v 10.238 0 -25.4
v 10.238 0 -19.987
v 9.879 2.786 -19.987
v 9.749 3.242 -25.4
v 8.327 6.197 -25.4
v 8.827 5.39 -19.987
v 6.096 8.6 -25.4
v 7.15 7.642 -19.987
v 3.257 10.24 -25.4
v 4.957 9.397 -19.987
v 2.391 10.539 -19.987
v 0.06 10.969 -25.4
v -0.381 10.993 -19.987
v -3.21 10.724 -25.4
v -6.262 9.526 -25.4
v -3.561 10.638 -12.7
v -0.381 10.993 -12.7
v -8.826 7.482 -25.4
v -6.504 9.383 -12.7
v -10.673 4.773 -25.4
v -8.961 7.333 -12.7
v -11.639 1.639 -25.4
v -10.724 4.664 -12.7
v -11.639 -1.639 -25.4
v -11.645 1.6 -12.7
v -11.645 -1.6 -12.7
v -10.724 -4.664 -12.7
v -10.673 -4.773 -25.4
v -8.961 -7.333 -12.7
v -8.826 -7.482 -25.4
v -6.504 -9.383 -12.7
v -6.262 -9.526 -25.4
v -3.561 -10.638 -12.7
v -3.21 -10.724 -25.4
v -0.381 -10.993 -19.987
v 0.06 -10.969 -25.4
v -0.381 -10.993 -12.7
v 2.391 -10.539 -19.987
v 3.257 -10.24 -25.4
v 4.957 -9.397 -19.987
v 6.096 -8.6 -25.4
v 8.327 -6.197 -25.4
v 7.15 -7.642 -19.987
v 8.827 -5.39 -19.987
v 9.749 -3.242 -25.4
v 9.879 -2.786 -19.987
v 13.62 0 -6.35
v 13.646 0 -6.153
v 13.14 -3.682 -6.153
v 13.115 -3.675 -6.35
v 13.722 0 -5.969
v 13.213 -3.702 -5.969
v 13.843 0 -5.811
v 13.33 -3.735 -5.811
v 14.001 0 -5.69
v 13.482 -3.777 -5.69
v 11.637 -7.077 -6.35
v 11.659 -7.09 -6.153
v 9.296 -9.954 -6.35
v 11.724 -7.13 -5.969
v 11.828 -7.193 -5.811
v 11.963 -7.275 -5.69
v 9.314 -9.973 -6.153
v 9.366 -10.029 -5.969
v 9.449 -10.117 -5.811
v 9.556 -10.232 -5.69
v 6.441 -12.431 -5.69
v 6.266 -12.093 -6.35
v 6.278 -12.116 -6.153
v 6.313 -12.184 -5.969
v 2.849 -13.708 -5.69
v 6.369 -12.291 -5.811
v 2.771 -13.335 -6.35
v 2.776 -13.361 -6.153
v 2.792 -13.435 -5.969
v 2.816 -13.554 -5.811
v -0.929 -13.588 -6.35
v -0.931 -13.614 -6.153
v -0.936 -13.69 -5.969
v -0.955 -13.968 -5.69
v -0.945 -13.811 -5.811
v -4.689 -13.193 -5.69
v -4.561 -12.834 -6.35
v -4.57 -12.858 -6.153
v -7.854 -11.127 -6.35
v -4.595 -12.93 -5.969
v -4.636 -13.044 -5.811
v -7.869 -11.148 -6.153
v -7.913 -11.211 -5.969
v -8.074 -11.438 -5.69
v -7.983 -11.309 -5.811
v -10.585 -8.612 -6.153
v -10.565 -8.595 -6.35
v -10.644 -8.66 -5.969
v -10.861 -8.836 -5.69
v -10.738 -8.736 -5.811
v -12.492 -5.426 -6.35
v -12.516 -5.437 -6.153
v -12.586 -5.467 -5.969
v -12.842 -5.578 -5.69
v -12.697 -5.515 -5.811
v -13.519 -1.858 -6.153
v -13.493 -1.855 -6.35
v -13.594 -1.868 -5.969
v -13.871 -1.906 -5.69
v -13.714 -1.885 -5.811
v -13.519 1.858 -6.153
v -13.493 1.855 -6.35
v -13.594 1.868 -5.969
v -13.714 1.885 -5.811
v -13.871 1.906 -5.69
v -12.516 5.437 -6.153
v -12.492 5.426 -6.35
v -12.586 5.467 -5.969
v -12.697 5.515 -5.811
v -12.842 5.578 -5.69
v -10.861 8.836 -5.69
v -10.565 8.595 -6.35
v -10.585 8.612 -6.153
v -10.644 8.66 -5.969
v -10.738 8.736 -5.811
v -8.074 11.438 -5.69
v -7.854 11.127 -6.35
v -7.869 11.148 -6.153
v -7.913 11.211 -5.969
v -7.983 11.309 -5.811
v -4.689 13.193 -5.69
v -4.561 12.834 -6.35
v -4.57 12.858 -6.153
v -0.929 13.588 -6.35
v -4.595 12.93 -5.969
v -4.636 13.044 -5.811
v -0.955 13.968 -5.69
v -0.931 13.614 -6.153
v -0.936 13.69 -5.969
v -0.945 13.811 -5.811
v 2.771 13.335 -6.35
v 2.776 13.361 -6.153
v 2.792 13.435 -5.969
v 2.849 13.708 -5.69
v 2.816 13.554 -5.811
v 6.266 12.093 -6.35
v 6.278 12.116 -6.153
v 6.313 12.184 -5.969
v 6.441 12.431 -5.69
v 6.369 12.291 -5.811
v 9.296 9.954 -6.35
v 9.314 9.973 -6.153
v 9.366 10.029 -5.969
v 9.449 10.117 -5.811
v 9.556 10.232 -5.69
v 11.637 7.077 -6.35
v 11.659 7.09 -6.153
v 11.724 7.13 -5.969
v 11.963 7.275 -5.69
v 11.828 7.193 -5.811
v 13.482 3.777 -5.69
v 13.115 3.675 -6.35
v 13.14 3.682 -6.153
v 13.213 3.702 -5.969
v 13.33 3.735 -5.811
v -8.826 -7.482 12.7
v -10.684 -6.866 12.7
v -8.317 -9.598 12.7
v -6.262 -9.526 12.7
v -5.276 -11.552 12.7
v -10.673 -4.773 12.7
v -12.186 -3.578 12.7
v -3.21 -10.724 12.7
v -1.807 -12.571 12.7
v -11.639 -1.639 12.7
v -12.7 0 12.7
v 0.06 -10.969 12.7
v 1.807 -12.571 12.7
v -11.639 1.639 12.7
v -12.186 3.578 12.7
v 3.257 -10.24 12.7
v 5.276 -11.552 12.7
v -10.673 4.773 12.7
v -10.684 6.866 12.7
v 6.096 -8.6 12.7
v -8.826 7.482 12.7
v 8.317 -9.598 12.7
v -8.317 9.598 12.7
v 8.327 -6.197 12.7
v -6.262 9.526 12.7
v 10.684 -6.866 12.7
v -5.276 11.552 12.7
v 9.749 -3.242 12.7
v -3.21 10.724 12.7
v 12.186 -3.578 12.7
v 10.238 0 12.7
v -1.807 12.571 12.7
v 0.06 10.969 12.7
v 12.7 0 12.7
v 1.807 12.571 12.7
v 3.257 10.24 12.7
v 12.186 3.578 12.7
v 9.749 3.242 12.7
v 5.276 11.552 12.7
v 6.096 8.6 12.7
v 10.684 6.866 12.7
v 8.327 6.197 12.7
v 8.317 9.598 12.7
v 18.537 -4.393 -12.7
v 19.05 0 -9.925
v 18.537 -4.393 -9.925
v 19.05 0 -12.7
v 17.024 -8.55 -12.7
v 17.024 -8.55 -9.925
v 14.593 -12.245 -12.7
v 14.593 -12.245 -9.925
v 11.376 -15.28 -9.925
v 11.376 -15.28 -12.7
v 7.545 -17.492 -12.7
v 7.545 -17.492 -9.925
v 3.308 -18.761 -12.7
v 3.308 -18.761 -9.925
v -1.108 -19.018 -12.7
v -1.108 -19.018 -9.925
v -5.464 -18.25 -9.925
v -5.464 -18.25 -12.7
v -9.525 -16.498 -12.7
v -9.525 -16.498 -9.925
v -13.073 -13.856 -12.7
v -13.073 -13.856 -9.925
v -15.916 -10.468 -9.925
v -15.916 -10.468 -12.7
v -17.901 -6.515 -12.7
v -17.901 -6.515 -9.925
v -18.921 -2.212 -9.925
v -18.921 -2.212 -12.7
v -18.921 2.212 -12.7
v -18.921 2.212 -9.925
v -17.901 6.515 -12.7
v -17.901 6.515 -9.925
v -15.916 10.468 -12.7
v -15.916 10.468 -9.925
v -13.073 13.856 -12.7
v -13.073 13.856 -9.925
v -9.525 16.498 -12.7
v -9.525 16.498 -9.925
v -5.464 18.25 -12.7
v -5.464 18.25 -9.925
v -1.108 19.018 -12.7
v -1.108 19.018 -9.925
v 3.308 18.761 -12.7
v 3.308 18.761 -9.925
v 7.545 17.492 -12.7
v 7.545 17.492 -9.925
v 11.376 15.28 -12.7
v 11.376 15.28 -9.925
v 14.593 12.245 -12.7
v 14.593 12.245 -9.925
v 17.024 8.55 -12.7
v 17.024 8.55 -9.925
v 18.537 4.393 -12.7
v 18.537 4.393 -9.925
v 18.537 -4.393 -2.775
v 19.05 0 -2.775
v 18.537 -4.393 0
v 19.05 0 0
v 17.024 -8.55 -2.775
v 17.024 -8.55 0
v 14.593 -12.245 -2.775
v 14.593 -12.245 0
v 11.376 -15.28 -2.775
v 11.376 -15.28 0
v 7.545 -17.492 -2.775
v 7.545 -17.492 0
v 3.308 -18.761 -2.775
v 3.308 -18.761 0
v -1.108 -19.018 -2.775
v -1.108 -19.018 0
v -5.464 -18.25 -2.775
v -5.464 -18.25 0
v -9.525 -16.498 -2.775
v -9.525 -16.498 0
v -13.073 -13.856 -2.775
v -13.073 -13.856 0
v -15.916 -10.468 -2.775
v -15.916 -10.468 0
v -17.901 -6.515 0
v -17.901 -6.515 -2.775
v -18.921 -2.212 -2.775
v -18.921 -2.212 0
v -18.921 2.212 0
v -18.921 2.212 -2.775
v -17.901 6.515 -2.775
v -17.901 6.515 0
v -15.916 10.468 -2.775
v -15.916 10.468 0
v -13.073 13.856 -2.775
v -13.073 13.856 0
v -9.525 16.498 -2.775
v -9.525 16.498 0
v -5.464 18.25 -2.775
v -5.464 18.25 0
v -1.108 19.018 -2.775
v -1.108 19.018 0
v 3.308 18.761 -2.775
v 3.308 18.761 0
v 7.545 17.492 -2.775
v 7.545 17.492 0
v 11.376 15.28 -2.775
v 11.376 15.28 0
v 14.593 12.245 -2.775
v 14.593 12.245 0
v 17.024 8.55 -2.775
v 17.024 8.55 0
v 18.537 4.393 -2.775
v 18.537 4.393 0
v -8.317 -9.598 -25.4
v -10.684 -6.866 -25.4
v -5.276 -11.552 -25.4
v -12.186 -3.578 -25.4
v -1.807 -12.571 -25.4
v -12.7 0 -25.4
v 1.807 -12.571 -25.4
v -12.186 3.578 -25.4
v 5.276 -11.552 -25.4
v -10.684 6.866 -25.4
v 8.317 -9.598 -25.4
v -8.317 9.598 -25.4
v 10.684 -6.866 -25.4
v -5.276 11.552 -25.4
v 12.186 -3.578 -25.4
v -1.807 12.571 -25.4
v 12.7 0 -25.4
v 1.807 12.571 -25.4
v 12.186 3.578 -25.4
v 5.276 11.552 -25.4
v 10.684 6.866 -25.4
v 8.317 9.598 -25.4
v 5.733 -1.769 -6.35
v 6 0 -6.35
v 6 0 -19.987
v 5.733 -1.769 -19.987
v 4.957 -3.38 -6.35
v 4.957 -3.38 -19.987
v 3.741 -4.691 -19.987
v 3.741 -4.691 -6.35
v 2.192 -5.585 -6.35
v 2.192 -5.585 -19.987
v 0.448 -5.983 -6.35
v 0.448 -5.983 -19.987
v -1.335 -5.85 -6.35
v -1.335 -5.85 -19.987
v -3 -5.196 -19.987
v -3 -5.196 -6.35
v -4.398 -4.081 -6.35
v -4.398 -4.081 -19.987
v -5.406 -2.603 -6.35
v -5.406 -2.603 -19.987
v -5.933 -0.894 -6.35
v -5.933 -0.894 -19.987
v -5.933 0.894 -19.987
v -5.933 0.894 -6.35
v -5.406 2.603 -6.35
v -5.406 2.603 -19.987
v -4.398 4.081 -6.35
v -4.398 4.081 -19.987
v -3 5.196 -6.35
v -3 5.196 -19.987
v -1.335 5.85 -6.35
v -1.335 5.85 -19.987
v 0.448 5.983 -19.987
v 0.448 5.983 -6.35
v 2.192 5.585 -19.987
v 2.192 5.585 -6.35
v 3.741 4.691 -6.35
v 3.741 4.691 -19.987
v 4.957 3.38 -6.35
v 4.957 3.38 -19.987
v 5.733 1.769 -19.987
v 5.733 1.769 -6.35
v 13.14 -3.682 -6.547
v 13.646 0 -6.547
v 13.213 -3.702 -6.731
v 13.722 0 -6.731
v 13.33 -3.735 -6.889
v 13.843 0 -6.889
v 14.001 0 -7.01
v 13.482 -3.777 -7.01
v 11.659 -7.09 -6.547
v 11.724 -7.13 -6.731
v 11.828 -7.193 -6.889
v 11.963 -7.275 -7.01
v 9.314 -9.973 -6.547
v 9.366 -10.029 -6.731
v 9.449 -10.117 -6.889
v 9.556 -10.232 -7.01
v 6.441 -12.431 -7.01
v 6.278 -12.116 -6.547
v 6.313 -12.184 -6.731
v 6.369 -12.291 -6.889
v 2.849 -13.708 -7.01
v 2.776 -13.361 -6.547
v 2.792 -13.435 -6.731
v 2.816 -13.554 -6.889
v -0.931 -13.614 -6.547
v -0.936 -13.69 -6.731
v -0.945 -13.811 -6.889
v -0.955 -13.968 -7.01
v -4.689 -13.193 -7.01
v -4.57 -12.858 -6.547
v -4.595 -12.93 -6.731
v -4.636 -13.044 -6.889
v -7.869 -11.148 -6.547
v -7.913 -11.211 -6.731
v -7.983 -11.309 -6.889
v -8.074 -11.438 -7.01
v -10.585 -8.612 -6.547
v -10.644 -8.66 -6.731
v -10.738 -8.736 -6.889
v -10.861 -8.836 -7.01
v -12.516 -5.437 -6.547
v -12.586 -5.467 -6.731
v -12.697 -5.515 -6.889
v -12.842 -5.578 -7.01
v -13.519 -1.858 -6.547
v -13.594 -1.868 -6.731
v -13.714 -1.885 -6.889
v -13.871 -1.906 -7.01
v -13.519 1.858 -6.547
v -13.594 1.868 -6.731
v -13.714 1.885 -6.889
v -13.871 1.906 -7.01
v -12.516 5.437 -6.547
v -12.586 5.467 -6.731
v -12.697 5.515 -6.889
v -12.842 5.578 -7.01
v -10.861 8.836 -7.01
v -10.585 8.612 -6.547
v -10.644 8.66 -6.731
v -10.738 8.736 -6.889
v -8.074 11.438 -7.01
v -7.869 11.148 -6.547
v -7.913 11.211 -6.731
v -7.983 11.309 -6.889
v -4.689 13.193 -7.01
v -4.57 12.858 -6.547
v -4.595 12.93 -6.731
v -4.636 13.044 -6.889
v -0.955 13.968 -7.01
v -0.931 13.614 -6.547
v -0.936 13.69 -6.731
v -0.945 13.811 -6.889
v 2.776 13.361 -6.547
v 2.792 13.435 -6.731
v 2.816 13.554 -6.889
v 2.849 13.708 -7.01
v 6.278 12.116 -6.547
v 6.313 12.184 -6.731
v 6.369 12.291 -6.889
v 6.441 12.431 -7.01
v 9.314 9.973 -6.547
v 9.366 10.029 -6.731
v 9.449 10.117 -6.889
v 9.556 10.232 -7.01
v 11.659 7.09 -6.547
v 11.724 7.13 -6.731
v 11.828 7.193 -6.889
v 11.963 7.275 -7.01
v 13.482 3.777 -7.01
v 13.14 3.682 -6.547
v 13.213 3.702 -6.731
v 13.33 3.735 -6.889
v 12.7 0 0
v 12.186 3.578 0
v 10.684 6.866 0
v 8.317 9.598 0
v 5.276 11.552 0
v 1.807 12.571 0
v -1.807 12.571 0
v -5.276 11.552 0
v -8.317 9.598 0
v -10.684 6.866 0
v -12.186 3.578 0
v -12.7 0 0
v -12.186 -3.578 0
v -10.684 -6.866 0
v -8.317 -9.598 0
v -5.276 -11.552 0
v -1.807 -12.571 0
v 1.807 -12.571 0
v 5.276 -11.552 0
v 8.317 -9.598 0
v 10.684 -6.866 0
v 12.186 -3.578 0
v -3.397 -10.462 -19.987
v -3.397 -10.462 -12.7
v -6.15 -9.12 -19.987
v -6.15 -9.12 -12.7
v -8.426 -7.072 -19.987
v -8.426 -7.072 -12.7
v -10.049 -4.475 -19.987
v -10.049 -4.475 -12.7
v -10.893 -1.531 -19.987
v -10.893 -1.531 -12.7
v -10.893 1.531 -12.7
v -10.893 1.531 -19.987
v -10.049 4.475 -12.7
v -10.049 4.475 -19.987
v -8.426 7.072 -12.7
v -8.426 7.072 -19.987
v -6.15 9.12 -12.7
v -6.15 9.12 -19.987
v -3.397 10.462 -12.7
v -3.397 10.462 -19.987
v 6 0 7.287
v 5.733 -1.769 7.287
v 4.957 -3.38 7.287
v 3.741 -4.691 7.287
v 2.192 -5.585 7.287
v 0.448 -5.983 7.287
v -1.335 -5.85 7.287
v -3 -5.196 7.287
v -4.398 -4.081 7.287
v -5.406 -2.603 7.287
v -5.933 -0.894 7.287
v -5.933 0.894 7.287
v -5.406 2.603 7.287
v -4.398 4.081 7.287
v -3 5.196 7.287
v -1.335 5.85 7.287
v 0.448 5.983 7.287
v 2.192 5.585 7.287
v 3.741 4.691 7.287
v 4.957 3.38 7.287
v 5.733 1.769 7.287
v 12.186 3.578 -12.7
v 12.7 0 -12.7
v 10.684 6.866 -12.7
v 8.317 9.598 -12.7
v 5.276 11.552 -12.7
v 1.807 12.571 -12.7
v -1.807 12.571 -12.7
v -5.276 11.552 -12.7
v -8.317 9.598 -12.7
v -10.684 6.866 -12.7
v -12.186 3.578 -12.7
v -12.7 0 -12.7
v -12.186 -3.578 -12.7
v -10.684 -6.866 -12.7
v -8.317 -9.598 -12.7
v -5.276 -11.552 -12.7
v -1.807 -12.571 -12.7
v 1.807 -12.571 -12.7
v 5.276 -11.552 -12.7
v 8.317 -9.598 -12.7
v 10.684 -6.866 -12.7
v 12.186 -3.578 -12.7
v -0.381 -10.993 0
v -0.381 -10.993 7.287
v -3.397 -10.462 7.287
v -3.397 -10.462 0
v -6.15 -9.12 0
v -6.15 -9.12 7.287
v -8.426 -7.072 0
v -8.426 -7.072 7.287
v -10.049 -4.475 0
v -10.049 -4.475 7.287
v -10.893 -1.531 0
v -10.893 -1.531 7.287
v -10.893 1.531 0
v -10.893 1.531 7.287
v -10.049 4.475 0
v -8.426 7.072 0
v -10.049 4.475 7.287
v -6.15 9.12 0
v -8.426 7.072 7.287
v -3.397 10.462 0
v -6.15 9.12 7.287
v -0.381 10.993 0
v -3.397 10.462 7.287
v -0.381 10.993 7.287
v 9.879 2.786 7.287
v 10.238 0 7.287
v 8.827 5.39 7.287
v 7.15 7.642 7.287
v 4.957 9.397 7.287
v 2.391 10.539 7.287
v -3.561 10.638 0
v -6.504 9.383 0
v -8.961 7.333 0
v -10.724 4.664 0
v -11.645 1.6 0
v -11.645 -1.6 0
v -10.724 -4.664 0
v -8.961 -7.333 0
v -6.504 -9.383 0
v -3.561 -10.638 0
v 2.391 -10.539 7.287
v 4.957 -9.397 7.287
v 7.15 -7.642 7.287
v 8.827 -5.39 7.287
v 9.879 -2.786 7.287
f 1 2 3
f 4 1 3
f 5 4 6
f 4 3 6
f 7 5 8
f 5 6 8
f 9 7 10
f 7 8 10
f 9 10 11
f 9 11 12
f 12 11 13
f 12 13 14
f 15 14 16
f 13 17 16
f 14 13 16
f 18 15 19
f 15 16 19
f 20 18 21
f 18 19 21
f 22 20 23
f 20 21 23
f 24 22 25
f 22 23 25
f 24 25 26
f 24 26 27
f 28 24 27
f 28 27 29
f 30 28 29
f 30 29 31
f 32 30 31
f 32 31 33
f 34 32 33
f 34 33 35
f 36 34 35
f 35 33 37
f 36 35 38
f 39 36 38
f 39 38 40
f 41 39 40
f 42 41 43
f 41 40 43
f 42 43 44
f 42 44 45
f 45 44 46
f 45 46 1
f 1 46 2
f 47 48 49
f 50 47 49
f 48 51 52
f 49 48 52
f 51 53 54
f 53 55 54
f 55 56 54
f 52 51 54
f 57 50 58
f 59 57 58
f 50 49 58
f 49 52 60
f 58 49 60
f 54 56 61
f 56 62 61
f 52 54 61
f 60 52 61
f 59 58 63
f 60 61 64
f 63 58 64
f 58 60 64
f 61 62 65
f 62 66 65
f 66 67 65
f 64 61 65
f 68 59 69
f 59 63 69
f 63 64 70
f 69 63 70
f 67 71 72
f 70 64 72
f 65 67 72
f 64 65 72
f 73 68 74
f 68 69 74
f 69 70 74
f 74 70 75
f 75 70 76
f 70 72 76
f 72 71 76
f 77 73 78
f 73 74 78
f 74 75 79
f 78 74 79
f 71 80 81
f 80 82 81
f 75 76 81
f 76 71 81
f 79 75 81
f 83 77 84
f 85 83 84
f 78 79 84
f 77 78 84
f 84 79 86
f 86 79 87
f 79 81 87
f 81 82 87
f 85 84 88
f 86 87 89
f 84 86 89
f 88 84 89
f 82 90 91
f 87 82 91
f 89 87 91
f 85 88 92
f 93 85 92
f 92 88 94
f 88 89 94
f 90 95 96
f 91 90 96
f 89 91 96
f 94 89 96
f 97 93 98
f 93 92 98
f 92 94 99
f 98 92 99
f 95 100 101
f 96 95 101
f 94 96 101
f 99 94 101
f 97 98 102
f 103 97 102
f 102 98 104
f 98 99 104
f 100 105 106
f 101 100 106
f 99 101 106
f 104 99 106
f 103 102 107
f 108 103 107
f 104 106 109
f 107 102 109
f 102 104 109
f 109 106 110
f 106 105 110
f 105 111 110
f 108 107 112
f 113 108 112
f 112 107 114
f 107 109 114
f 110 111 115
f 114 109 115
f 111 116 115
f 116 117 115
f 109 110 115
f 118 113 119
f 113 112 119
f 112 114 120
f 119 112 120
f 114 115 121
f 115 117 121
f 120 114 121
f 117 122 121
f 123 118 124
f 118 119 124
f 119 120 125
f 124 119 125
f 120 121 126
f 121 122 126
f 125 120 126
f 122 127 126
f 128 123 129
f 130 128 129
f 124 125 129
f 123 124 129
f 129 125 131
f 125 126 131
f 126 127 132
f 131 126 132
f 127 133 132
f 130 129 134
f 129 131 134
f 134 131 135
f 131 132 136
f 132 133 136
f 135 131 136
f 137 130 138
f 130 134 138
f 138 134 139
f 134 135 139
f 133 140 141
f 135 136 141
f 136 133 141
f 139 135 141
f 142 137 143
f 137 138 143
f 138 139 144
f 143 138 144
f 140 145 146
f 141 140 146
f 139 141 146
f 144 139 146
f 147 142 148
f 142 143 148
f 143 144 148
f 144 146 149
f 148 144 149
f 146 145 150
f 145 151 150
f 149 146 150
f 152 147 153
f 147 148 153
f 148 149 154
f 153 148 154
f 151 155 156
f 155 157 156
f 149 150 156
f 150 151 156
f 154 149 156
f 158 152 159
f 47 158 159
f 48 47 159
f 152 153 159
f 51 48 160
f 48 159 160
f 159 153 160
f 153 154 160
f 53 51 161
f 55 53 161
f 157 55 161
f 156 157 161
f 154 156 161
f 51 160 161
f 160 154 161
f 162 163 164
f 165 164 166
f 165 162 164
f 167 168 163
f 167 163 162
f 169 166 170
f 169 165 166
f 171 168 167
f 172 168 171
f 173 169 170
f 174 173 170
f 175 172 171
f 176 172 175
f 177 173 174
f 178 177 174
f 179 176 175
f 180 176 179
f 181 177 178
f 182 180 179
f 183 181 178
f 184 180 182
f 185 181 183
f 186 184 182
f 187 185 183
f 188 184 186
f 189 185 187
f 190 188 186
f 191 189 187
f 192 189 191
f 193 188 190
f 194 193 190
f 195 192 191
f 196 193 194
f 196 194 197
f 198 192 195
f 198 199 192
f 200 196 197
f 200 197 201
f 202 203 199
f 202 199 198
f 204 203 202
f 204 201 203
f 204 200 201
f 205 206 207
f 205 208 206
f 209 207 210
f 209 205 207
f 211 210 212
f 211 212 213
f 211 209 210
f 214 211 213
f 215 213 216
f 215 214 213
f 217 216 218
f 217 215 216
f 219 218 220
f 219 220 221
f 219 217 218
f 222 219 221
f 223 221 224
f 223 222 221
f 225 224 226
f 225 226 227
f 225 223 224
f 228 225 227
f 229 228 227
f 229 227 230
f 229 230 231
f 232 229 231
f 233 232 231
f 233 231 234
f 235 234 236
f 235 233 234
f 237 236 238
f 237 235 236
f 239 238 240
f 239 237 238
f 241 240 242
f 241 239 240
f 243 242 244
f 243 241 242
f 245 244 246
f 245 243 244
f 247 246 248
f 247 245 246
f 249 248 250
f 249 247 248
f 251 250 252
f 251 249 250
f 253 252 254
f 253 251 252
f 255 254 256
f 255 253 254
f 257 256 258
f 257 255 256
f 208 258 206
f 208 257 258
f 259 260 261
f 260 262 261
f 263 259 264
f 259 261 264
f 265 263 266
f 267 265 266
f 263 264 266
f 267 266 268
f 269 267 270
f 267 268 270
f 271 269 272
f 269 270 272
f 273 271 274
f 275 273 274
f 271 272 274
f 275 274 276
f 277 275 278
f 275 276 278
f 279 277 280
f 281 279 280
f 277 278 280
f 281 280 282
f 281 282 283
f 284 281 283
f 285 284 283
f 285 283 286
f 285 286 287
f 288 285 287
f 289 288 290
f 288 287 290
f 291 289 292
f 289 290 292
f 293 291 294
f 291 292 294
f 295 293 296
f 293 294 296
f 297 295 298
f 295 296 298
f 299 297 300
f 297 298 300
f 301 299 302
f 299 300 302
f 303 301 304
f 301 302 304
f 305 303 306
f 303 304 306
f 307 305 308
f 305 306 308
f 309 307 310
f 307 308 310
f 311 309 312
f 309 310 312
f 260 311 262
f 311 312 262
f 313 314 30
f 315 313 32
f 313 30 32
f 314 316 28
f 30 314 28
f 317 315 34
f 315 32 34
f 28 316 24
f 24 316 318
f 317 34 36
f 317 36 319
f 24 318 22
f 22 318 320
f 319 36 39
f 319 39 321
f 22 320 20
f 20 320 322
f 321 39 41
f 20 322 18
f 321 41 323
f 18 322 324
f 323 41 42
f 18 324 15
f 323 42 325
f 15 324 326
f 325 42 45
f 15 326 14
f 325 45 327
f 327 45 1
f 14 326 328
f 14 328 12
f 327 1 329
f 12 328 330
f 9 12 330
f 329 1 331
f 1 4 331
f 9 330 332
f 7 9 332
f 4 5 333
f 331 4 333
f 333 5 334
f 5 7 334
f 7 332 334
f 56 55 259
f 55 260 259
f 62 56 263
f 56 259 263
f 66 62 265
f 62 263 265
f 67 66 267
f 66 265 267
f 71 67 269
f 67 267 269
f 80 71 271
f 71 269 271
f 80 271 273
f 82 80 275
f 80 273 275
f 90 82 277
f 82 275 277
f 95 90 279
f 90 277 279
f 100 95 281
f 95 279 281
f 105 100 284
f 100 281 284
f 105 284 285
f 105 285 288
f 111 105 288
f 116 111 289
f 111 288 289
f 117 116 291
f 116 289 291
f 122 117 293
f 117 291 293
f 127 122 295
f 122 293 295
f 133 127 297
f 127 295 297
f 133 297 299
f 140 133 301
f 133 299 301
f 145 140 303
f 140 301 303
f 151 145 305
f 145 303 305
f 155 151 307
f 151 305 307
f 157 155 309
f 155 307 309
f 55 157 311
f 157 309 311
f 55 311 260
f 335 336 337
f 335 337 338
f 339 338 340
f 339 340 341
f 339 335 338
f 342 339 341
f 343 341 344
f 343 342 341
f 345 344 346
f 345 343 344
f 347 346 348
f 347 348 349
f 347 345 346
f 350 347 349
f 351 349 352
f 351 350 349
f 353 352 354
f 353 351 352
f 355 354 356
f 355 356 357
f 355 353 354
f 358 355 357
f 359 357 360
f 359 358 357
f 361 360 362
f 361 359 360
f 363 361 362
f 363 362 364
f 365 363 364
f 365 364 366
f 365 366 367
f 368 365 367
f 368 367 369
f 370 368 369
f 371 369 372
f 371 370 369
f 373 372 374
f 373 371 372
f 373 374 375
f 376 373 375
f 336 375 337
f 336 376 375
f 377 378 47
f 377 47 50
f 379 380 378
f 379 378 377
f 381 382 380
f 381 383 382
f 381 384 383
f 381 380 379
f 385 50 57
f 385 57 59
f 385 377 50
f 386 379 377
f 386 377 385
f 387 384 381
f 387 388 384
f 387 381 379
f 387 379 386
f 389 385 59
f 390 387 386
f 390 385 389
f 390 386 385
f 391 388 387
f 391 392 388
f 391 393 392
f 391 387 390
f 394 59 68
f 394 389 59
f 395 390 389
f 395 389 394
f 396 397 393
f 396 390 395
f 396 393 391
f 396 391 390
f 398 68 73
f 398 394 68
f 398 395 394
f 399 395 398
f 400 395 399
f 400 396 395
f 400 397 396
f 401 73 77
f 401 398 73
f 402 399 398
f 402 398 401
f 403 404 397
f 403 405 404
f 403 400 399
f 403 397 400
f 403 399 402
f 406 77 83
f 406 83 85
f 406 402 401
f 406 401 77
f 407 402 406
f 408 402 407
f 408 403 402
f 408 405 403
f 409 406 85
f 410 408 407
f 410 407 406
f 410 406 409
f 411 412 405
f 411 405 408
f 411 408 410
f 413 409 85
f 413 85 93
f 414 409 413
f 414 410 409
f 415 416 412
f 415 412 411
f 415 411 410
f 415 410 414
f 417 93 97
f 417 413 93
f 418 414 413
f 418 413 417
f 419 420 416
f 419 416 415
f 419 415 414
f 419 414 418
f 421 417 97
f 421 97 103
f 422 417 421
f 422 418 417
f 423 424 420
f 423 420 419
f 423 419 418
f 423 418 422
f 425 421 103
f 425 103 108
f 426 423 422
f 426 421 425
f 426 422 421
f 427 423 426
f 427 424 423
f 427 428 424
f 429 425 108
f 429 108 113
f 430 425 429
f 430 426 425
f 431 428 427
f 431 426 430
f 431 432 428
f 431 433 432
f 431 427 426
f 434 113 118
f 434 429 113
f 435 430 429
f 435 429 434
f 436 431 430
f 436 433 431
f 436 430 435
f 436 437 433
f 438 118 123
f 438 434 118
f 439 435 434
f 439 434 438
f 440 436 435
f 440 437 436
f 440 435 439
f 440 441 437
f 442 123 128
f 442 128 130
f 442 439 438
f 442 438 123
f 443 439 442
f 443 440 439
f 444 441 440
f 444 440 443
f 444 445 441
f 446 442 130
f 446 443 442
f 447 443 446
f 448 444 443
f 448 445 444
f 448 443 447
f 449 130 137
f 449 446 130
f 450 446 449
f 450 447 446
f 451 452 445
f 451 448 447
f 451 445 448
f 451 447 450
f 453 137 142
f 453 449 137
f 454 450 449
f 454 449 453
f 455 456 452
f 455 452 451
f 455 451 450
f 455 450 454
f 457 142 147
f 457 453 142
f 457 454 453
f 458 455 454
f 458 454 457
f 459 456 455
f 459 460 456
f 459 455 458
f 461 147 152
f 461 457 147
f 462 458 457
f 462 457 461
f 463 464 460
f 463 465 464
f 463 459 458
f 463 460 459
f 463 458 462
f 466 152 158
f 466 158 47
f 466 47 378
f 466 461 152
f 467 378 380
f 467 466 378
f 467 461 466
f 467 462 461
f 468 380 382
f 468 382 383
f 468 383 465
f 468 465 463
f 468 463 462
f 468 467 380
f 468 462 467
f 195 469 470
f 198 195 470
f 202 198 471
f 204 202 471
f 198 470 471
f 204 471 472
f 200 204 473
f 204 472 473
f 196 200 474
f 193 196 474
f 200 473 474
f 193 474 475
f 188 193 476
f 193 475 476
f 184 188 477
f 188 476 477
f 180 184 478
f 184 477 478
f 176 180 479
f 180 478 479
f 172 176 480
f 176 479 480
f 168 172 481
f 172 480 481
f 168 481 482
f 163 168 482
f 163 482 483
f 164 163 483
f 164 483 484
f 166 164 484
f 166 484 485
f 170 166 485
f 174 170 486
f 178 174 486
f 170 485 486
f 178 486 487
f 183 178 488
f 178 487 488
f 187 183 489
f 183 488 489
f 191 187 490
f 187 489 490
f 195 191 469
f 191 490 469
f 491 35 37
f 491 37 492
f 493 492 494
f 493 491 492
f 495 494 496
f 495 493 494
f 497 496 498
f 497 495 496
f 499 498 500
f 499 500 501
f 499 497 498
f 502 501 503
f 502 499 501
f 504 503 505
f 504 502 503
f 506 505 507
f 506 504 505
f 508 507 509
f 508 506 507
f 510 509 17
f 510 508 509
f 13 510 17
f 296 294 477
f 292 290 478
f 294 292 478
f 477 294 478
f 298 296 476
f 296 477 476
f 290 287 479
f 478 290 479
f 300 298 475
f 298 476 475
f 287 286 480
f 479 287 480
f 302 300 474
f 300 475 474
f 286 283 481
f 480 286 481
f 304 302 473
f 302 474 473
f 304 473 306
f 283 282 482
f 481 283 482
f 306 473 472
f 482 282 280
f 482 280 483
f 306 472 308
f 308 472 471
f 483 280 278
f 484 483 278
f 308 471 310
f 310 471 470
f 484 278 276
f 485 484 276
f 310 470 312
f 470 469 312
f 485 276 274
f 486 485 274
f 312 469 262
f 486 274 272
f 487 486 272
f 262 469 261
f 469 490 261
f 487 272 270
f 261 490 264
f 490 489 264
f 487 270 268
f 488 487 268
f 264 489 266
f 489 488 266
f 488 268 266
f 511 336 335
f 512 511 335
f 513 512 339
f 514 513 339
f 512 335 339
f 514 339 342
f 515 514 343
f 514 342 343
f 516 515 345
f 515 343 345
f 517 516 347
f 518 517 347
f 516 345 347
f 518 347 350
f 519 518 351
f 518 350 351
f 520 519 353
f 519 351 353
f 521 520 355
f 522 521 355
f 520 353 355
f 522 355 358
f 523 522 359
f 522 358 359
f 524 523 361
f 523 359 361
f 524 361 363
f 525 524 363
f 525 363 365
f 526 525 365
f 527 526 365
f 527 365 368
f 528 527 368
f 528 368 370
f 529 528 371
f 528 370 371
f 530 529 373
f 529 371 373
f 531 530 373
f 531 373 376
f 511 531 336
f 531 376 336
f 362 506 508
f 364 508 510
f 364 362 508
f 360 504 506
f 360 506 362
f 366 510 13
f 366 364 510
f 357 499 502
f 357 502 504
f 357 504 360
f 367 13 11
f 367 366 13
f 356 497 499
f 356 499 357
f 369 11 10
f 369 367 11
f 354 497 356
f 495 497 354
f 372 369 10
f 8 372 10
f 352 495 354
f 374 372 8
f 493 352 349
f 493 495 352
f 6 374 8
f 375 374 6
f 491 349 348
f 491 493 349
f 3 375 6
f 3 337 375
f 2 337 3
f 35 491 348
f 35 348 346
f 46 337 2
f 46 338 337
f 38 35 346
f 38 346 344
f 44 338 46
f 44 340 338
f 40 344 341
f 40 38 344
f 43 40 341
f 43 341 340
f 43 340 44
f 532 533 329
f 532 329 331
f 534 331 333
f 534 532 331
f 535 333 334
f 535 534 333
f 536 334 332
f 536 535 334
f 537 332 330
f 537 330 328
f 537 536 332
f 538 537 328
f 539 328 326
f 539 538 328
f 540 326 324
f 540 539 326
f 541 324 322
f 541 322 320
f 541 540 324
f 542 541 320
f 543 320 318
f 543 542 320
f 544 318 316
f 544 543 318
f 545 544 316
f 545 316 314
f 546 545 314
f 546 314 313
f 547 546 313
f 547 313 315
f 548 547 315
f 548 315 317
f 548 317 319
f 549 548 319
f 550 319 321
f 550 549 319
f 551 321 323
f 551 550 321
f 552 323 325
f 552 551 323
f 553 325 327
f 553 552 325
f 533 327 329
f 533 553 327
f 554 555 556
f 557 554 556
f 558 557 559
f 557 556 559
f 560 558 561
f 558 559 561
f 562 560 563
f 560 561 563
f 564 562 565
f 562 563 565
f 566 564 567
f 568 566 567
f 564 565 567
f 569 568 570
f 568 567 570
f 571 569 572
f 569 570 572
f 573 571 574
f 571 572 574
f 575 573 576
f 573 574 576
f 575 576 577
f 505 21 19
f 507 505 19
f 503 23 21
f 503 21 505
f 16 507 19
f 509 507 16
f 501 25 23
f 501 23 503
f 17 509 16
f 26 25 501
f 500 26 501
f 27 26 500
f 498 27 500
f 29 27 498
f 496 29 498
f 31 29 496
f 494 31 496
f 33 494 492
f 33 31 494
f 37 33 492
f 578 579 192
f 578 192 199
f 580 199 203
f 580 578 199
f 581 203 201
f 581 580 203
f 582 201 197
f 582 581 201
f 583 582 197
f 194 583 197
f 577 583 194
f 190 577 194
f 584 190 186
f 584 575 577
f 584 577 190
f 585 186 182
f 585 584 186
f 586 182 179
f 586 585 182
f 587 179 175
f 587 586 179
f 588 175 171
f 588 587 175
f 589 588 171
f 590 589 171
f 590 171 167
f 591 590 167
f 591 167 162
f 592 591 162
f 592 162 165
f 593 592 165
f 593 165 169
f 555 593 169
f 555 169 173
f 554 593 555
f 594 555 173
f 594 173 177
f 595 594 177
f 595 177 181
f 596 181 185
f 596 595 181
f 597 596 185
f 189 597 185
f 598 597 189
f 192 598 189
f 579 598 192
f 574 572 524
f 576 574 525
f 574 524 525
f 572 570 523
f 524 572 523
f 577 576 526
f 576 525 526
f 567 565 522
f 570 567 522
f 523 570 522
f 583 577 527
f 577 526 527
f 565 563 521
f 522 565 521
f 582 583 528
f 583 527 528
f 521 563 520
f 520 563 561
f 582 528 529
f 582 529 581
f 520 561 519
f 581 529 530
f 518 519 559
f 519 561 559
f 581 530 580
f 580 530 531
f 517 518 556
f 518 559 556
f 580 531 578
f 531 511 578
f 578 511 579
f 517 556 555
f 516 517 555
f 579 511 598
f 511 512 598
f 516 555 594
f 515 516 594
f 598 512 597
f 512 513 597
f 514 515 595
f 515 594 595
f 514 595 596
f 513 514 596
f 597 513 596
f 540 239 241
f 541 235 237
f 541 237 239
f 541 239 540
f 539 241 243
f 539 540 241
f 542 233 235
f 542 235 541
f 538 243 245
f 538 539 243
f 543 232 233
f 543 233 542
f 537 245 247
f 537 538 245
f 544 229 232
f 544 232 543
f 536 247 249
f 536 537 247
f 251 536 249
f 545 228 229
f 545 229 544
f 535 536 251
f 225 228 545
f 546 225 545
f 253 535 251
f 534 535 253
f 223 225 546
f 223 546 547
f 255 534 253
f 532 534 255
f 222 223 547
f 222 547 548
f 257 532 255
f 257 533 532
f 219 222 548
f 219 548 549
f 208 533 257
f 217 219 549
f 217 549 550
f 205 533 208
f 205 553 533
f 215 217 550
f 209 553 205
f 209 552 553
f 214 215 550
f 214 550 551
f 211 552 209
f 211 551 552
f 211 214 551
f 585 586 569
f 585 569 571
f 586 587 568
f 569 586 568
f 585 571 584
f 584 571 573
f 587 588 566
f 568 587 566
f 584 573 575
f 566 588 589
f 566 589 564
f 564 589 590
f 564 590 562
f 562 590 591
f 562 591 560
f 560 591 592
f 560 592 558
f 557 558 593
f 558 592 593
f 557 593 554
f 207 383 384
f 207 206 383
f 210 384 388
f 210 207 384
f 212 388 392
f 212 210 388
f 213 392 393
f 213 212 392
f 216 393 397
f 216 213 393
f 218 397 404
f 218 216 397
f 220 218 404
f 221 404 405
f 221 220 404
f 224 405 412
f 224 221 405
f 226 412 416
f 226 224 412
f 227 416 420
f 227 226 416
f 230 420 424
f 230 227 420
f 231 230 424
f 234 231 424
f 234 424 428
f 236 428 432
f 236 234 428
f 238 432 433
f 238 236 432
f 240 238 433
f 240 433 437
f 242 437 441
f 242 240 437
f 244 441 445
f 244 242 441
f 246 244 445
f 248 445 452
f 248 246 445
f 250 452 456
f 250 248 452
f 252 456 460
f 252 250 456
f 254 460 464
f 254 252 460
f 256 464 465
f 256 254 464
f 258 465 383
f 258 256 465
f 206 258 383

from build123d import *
from build123d.topology import SkipClean

# Parameters (mm, degrees)
SKETCH1_R           = 12.7
SKETCH1_R_2         = 11
BOSS_EXTRUDE1_DEPTH = 12.7


with BuildPart() as part:
    # Sketch1 → Boss-Extrude1 (new body)
    with BuildSketch(Plane.XY):
        Circle(SKETCH1_R)
        with Locations((-0.762, 0)):
            Circle(SKETCH1_R_2, mode=Mode.SUBTRACT)
    extrude(amount=BOSS_EXTRUDE1_DEPTH)

    # Sketch2 → Revolve1 (revolve)
    with BuildSketch(Plane(origin=(0, 0, 0), x_dir=(0, 0, -1), z_dir=(1, 0, 0))):
        with BuildLine():
            Line((-7.2874886, 11), (-7.2874886, 6))
            Line((-7.2874886, 6), (6.35, 6))
            Line((6.35, 6), (6.35, 13.62))
            ThreePointArc((6.35, 13.62), (5.969, 13.722088642), (5.690088642, 14.001))
            Line((5.690088642, 14.001), (2.775047133, 19.05))
            Line((2.775047133, 19.05), (0, 19.05))
            Line((0, 19.05), (0, 11))
            Line((0, 11), (-7.2874886, 11))
        make_face()
    revolve(axis=Axis((0, 0, 0), (0, 0, -1)))

    # Mirror1: part across plane


with BuildPart() as part_1:
    with SkipClean():  # the faces are left unmerged after this step: merging them gives an invalid solid
        add(part.part)
        add(part.part.mirror(Plane(origin=(0, 6, -6.35), x_dir=(1, 0, 0), z_dir=(0, 0, 1))))


solid = part_1.part
